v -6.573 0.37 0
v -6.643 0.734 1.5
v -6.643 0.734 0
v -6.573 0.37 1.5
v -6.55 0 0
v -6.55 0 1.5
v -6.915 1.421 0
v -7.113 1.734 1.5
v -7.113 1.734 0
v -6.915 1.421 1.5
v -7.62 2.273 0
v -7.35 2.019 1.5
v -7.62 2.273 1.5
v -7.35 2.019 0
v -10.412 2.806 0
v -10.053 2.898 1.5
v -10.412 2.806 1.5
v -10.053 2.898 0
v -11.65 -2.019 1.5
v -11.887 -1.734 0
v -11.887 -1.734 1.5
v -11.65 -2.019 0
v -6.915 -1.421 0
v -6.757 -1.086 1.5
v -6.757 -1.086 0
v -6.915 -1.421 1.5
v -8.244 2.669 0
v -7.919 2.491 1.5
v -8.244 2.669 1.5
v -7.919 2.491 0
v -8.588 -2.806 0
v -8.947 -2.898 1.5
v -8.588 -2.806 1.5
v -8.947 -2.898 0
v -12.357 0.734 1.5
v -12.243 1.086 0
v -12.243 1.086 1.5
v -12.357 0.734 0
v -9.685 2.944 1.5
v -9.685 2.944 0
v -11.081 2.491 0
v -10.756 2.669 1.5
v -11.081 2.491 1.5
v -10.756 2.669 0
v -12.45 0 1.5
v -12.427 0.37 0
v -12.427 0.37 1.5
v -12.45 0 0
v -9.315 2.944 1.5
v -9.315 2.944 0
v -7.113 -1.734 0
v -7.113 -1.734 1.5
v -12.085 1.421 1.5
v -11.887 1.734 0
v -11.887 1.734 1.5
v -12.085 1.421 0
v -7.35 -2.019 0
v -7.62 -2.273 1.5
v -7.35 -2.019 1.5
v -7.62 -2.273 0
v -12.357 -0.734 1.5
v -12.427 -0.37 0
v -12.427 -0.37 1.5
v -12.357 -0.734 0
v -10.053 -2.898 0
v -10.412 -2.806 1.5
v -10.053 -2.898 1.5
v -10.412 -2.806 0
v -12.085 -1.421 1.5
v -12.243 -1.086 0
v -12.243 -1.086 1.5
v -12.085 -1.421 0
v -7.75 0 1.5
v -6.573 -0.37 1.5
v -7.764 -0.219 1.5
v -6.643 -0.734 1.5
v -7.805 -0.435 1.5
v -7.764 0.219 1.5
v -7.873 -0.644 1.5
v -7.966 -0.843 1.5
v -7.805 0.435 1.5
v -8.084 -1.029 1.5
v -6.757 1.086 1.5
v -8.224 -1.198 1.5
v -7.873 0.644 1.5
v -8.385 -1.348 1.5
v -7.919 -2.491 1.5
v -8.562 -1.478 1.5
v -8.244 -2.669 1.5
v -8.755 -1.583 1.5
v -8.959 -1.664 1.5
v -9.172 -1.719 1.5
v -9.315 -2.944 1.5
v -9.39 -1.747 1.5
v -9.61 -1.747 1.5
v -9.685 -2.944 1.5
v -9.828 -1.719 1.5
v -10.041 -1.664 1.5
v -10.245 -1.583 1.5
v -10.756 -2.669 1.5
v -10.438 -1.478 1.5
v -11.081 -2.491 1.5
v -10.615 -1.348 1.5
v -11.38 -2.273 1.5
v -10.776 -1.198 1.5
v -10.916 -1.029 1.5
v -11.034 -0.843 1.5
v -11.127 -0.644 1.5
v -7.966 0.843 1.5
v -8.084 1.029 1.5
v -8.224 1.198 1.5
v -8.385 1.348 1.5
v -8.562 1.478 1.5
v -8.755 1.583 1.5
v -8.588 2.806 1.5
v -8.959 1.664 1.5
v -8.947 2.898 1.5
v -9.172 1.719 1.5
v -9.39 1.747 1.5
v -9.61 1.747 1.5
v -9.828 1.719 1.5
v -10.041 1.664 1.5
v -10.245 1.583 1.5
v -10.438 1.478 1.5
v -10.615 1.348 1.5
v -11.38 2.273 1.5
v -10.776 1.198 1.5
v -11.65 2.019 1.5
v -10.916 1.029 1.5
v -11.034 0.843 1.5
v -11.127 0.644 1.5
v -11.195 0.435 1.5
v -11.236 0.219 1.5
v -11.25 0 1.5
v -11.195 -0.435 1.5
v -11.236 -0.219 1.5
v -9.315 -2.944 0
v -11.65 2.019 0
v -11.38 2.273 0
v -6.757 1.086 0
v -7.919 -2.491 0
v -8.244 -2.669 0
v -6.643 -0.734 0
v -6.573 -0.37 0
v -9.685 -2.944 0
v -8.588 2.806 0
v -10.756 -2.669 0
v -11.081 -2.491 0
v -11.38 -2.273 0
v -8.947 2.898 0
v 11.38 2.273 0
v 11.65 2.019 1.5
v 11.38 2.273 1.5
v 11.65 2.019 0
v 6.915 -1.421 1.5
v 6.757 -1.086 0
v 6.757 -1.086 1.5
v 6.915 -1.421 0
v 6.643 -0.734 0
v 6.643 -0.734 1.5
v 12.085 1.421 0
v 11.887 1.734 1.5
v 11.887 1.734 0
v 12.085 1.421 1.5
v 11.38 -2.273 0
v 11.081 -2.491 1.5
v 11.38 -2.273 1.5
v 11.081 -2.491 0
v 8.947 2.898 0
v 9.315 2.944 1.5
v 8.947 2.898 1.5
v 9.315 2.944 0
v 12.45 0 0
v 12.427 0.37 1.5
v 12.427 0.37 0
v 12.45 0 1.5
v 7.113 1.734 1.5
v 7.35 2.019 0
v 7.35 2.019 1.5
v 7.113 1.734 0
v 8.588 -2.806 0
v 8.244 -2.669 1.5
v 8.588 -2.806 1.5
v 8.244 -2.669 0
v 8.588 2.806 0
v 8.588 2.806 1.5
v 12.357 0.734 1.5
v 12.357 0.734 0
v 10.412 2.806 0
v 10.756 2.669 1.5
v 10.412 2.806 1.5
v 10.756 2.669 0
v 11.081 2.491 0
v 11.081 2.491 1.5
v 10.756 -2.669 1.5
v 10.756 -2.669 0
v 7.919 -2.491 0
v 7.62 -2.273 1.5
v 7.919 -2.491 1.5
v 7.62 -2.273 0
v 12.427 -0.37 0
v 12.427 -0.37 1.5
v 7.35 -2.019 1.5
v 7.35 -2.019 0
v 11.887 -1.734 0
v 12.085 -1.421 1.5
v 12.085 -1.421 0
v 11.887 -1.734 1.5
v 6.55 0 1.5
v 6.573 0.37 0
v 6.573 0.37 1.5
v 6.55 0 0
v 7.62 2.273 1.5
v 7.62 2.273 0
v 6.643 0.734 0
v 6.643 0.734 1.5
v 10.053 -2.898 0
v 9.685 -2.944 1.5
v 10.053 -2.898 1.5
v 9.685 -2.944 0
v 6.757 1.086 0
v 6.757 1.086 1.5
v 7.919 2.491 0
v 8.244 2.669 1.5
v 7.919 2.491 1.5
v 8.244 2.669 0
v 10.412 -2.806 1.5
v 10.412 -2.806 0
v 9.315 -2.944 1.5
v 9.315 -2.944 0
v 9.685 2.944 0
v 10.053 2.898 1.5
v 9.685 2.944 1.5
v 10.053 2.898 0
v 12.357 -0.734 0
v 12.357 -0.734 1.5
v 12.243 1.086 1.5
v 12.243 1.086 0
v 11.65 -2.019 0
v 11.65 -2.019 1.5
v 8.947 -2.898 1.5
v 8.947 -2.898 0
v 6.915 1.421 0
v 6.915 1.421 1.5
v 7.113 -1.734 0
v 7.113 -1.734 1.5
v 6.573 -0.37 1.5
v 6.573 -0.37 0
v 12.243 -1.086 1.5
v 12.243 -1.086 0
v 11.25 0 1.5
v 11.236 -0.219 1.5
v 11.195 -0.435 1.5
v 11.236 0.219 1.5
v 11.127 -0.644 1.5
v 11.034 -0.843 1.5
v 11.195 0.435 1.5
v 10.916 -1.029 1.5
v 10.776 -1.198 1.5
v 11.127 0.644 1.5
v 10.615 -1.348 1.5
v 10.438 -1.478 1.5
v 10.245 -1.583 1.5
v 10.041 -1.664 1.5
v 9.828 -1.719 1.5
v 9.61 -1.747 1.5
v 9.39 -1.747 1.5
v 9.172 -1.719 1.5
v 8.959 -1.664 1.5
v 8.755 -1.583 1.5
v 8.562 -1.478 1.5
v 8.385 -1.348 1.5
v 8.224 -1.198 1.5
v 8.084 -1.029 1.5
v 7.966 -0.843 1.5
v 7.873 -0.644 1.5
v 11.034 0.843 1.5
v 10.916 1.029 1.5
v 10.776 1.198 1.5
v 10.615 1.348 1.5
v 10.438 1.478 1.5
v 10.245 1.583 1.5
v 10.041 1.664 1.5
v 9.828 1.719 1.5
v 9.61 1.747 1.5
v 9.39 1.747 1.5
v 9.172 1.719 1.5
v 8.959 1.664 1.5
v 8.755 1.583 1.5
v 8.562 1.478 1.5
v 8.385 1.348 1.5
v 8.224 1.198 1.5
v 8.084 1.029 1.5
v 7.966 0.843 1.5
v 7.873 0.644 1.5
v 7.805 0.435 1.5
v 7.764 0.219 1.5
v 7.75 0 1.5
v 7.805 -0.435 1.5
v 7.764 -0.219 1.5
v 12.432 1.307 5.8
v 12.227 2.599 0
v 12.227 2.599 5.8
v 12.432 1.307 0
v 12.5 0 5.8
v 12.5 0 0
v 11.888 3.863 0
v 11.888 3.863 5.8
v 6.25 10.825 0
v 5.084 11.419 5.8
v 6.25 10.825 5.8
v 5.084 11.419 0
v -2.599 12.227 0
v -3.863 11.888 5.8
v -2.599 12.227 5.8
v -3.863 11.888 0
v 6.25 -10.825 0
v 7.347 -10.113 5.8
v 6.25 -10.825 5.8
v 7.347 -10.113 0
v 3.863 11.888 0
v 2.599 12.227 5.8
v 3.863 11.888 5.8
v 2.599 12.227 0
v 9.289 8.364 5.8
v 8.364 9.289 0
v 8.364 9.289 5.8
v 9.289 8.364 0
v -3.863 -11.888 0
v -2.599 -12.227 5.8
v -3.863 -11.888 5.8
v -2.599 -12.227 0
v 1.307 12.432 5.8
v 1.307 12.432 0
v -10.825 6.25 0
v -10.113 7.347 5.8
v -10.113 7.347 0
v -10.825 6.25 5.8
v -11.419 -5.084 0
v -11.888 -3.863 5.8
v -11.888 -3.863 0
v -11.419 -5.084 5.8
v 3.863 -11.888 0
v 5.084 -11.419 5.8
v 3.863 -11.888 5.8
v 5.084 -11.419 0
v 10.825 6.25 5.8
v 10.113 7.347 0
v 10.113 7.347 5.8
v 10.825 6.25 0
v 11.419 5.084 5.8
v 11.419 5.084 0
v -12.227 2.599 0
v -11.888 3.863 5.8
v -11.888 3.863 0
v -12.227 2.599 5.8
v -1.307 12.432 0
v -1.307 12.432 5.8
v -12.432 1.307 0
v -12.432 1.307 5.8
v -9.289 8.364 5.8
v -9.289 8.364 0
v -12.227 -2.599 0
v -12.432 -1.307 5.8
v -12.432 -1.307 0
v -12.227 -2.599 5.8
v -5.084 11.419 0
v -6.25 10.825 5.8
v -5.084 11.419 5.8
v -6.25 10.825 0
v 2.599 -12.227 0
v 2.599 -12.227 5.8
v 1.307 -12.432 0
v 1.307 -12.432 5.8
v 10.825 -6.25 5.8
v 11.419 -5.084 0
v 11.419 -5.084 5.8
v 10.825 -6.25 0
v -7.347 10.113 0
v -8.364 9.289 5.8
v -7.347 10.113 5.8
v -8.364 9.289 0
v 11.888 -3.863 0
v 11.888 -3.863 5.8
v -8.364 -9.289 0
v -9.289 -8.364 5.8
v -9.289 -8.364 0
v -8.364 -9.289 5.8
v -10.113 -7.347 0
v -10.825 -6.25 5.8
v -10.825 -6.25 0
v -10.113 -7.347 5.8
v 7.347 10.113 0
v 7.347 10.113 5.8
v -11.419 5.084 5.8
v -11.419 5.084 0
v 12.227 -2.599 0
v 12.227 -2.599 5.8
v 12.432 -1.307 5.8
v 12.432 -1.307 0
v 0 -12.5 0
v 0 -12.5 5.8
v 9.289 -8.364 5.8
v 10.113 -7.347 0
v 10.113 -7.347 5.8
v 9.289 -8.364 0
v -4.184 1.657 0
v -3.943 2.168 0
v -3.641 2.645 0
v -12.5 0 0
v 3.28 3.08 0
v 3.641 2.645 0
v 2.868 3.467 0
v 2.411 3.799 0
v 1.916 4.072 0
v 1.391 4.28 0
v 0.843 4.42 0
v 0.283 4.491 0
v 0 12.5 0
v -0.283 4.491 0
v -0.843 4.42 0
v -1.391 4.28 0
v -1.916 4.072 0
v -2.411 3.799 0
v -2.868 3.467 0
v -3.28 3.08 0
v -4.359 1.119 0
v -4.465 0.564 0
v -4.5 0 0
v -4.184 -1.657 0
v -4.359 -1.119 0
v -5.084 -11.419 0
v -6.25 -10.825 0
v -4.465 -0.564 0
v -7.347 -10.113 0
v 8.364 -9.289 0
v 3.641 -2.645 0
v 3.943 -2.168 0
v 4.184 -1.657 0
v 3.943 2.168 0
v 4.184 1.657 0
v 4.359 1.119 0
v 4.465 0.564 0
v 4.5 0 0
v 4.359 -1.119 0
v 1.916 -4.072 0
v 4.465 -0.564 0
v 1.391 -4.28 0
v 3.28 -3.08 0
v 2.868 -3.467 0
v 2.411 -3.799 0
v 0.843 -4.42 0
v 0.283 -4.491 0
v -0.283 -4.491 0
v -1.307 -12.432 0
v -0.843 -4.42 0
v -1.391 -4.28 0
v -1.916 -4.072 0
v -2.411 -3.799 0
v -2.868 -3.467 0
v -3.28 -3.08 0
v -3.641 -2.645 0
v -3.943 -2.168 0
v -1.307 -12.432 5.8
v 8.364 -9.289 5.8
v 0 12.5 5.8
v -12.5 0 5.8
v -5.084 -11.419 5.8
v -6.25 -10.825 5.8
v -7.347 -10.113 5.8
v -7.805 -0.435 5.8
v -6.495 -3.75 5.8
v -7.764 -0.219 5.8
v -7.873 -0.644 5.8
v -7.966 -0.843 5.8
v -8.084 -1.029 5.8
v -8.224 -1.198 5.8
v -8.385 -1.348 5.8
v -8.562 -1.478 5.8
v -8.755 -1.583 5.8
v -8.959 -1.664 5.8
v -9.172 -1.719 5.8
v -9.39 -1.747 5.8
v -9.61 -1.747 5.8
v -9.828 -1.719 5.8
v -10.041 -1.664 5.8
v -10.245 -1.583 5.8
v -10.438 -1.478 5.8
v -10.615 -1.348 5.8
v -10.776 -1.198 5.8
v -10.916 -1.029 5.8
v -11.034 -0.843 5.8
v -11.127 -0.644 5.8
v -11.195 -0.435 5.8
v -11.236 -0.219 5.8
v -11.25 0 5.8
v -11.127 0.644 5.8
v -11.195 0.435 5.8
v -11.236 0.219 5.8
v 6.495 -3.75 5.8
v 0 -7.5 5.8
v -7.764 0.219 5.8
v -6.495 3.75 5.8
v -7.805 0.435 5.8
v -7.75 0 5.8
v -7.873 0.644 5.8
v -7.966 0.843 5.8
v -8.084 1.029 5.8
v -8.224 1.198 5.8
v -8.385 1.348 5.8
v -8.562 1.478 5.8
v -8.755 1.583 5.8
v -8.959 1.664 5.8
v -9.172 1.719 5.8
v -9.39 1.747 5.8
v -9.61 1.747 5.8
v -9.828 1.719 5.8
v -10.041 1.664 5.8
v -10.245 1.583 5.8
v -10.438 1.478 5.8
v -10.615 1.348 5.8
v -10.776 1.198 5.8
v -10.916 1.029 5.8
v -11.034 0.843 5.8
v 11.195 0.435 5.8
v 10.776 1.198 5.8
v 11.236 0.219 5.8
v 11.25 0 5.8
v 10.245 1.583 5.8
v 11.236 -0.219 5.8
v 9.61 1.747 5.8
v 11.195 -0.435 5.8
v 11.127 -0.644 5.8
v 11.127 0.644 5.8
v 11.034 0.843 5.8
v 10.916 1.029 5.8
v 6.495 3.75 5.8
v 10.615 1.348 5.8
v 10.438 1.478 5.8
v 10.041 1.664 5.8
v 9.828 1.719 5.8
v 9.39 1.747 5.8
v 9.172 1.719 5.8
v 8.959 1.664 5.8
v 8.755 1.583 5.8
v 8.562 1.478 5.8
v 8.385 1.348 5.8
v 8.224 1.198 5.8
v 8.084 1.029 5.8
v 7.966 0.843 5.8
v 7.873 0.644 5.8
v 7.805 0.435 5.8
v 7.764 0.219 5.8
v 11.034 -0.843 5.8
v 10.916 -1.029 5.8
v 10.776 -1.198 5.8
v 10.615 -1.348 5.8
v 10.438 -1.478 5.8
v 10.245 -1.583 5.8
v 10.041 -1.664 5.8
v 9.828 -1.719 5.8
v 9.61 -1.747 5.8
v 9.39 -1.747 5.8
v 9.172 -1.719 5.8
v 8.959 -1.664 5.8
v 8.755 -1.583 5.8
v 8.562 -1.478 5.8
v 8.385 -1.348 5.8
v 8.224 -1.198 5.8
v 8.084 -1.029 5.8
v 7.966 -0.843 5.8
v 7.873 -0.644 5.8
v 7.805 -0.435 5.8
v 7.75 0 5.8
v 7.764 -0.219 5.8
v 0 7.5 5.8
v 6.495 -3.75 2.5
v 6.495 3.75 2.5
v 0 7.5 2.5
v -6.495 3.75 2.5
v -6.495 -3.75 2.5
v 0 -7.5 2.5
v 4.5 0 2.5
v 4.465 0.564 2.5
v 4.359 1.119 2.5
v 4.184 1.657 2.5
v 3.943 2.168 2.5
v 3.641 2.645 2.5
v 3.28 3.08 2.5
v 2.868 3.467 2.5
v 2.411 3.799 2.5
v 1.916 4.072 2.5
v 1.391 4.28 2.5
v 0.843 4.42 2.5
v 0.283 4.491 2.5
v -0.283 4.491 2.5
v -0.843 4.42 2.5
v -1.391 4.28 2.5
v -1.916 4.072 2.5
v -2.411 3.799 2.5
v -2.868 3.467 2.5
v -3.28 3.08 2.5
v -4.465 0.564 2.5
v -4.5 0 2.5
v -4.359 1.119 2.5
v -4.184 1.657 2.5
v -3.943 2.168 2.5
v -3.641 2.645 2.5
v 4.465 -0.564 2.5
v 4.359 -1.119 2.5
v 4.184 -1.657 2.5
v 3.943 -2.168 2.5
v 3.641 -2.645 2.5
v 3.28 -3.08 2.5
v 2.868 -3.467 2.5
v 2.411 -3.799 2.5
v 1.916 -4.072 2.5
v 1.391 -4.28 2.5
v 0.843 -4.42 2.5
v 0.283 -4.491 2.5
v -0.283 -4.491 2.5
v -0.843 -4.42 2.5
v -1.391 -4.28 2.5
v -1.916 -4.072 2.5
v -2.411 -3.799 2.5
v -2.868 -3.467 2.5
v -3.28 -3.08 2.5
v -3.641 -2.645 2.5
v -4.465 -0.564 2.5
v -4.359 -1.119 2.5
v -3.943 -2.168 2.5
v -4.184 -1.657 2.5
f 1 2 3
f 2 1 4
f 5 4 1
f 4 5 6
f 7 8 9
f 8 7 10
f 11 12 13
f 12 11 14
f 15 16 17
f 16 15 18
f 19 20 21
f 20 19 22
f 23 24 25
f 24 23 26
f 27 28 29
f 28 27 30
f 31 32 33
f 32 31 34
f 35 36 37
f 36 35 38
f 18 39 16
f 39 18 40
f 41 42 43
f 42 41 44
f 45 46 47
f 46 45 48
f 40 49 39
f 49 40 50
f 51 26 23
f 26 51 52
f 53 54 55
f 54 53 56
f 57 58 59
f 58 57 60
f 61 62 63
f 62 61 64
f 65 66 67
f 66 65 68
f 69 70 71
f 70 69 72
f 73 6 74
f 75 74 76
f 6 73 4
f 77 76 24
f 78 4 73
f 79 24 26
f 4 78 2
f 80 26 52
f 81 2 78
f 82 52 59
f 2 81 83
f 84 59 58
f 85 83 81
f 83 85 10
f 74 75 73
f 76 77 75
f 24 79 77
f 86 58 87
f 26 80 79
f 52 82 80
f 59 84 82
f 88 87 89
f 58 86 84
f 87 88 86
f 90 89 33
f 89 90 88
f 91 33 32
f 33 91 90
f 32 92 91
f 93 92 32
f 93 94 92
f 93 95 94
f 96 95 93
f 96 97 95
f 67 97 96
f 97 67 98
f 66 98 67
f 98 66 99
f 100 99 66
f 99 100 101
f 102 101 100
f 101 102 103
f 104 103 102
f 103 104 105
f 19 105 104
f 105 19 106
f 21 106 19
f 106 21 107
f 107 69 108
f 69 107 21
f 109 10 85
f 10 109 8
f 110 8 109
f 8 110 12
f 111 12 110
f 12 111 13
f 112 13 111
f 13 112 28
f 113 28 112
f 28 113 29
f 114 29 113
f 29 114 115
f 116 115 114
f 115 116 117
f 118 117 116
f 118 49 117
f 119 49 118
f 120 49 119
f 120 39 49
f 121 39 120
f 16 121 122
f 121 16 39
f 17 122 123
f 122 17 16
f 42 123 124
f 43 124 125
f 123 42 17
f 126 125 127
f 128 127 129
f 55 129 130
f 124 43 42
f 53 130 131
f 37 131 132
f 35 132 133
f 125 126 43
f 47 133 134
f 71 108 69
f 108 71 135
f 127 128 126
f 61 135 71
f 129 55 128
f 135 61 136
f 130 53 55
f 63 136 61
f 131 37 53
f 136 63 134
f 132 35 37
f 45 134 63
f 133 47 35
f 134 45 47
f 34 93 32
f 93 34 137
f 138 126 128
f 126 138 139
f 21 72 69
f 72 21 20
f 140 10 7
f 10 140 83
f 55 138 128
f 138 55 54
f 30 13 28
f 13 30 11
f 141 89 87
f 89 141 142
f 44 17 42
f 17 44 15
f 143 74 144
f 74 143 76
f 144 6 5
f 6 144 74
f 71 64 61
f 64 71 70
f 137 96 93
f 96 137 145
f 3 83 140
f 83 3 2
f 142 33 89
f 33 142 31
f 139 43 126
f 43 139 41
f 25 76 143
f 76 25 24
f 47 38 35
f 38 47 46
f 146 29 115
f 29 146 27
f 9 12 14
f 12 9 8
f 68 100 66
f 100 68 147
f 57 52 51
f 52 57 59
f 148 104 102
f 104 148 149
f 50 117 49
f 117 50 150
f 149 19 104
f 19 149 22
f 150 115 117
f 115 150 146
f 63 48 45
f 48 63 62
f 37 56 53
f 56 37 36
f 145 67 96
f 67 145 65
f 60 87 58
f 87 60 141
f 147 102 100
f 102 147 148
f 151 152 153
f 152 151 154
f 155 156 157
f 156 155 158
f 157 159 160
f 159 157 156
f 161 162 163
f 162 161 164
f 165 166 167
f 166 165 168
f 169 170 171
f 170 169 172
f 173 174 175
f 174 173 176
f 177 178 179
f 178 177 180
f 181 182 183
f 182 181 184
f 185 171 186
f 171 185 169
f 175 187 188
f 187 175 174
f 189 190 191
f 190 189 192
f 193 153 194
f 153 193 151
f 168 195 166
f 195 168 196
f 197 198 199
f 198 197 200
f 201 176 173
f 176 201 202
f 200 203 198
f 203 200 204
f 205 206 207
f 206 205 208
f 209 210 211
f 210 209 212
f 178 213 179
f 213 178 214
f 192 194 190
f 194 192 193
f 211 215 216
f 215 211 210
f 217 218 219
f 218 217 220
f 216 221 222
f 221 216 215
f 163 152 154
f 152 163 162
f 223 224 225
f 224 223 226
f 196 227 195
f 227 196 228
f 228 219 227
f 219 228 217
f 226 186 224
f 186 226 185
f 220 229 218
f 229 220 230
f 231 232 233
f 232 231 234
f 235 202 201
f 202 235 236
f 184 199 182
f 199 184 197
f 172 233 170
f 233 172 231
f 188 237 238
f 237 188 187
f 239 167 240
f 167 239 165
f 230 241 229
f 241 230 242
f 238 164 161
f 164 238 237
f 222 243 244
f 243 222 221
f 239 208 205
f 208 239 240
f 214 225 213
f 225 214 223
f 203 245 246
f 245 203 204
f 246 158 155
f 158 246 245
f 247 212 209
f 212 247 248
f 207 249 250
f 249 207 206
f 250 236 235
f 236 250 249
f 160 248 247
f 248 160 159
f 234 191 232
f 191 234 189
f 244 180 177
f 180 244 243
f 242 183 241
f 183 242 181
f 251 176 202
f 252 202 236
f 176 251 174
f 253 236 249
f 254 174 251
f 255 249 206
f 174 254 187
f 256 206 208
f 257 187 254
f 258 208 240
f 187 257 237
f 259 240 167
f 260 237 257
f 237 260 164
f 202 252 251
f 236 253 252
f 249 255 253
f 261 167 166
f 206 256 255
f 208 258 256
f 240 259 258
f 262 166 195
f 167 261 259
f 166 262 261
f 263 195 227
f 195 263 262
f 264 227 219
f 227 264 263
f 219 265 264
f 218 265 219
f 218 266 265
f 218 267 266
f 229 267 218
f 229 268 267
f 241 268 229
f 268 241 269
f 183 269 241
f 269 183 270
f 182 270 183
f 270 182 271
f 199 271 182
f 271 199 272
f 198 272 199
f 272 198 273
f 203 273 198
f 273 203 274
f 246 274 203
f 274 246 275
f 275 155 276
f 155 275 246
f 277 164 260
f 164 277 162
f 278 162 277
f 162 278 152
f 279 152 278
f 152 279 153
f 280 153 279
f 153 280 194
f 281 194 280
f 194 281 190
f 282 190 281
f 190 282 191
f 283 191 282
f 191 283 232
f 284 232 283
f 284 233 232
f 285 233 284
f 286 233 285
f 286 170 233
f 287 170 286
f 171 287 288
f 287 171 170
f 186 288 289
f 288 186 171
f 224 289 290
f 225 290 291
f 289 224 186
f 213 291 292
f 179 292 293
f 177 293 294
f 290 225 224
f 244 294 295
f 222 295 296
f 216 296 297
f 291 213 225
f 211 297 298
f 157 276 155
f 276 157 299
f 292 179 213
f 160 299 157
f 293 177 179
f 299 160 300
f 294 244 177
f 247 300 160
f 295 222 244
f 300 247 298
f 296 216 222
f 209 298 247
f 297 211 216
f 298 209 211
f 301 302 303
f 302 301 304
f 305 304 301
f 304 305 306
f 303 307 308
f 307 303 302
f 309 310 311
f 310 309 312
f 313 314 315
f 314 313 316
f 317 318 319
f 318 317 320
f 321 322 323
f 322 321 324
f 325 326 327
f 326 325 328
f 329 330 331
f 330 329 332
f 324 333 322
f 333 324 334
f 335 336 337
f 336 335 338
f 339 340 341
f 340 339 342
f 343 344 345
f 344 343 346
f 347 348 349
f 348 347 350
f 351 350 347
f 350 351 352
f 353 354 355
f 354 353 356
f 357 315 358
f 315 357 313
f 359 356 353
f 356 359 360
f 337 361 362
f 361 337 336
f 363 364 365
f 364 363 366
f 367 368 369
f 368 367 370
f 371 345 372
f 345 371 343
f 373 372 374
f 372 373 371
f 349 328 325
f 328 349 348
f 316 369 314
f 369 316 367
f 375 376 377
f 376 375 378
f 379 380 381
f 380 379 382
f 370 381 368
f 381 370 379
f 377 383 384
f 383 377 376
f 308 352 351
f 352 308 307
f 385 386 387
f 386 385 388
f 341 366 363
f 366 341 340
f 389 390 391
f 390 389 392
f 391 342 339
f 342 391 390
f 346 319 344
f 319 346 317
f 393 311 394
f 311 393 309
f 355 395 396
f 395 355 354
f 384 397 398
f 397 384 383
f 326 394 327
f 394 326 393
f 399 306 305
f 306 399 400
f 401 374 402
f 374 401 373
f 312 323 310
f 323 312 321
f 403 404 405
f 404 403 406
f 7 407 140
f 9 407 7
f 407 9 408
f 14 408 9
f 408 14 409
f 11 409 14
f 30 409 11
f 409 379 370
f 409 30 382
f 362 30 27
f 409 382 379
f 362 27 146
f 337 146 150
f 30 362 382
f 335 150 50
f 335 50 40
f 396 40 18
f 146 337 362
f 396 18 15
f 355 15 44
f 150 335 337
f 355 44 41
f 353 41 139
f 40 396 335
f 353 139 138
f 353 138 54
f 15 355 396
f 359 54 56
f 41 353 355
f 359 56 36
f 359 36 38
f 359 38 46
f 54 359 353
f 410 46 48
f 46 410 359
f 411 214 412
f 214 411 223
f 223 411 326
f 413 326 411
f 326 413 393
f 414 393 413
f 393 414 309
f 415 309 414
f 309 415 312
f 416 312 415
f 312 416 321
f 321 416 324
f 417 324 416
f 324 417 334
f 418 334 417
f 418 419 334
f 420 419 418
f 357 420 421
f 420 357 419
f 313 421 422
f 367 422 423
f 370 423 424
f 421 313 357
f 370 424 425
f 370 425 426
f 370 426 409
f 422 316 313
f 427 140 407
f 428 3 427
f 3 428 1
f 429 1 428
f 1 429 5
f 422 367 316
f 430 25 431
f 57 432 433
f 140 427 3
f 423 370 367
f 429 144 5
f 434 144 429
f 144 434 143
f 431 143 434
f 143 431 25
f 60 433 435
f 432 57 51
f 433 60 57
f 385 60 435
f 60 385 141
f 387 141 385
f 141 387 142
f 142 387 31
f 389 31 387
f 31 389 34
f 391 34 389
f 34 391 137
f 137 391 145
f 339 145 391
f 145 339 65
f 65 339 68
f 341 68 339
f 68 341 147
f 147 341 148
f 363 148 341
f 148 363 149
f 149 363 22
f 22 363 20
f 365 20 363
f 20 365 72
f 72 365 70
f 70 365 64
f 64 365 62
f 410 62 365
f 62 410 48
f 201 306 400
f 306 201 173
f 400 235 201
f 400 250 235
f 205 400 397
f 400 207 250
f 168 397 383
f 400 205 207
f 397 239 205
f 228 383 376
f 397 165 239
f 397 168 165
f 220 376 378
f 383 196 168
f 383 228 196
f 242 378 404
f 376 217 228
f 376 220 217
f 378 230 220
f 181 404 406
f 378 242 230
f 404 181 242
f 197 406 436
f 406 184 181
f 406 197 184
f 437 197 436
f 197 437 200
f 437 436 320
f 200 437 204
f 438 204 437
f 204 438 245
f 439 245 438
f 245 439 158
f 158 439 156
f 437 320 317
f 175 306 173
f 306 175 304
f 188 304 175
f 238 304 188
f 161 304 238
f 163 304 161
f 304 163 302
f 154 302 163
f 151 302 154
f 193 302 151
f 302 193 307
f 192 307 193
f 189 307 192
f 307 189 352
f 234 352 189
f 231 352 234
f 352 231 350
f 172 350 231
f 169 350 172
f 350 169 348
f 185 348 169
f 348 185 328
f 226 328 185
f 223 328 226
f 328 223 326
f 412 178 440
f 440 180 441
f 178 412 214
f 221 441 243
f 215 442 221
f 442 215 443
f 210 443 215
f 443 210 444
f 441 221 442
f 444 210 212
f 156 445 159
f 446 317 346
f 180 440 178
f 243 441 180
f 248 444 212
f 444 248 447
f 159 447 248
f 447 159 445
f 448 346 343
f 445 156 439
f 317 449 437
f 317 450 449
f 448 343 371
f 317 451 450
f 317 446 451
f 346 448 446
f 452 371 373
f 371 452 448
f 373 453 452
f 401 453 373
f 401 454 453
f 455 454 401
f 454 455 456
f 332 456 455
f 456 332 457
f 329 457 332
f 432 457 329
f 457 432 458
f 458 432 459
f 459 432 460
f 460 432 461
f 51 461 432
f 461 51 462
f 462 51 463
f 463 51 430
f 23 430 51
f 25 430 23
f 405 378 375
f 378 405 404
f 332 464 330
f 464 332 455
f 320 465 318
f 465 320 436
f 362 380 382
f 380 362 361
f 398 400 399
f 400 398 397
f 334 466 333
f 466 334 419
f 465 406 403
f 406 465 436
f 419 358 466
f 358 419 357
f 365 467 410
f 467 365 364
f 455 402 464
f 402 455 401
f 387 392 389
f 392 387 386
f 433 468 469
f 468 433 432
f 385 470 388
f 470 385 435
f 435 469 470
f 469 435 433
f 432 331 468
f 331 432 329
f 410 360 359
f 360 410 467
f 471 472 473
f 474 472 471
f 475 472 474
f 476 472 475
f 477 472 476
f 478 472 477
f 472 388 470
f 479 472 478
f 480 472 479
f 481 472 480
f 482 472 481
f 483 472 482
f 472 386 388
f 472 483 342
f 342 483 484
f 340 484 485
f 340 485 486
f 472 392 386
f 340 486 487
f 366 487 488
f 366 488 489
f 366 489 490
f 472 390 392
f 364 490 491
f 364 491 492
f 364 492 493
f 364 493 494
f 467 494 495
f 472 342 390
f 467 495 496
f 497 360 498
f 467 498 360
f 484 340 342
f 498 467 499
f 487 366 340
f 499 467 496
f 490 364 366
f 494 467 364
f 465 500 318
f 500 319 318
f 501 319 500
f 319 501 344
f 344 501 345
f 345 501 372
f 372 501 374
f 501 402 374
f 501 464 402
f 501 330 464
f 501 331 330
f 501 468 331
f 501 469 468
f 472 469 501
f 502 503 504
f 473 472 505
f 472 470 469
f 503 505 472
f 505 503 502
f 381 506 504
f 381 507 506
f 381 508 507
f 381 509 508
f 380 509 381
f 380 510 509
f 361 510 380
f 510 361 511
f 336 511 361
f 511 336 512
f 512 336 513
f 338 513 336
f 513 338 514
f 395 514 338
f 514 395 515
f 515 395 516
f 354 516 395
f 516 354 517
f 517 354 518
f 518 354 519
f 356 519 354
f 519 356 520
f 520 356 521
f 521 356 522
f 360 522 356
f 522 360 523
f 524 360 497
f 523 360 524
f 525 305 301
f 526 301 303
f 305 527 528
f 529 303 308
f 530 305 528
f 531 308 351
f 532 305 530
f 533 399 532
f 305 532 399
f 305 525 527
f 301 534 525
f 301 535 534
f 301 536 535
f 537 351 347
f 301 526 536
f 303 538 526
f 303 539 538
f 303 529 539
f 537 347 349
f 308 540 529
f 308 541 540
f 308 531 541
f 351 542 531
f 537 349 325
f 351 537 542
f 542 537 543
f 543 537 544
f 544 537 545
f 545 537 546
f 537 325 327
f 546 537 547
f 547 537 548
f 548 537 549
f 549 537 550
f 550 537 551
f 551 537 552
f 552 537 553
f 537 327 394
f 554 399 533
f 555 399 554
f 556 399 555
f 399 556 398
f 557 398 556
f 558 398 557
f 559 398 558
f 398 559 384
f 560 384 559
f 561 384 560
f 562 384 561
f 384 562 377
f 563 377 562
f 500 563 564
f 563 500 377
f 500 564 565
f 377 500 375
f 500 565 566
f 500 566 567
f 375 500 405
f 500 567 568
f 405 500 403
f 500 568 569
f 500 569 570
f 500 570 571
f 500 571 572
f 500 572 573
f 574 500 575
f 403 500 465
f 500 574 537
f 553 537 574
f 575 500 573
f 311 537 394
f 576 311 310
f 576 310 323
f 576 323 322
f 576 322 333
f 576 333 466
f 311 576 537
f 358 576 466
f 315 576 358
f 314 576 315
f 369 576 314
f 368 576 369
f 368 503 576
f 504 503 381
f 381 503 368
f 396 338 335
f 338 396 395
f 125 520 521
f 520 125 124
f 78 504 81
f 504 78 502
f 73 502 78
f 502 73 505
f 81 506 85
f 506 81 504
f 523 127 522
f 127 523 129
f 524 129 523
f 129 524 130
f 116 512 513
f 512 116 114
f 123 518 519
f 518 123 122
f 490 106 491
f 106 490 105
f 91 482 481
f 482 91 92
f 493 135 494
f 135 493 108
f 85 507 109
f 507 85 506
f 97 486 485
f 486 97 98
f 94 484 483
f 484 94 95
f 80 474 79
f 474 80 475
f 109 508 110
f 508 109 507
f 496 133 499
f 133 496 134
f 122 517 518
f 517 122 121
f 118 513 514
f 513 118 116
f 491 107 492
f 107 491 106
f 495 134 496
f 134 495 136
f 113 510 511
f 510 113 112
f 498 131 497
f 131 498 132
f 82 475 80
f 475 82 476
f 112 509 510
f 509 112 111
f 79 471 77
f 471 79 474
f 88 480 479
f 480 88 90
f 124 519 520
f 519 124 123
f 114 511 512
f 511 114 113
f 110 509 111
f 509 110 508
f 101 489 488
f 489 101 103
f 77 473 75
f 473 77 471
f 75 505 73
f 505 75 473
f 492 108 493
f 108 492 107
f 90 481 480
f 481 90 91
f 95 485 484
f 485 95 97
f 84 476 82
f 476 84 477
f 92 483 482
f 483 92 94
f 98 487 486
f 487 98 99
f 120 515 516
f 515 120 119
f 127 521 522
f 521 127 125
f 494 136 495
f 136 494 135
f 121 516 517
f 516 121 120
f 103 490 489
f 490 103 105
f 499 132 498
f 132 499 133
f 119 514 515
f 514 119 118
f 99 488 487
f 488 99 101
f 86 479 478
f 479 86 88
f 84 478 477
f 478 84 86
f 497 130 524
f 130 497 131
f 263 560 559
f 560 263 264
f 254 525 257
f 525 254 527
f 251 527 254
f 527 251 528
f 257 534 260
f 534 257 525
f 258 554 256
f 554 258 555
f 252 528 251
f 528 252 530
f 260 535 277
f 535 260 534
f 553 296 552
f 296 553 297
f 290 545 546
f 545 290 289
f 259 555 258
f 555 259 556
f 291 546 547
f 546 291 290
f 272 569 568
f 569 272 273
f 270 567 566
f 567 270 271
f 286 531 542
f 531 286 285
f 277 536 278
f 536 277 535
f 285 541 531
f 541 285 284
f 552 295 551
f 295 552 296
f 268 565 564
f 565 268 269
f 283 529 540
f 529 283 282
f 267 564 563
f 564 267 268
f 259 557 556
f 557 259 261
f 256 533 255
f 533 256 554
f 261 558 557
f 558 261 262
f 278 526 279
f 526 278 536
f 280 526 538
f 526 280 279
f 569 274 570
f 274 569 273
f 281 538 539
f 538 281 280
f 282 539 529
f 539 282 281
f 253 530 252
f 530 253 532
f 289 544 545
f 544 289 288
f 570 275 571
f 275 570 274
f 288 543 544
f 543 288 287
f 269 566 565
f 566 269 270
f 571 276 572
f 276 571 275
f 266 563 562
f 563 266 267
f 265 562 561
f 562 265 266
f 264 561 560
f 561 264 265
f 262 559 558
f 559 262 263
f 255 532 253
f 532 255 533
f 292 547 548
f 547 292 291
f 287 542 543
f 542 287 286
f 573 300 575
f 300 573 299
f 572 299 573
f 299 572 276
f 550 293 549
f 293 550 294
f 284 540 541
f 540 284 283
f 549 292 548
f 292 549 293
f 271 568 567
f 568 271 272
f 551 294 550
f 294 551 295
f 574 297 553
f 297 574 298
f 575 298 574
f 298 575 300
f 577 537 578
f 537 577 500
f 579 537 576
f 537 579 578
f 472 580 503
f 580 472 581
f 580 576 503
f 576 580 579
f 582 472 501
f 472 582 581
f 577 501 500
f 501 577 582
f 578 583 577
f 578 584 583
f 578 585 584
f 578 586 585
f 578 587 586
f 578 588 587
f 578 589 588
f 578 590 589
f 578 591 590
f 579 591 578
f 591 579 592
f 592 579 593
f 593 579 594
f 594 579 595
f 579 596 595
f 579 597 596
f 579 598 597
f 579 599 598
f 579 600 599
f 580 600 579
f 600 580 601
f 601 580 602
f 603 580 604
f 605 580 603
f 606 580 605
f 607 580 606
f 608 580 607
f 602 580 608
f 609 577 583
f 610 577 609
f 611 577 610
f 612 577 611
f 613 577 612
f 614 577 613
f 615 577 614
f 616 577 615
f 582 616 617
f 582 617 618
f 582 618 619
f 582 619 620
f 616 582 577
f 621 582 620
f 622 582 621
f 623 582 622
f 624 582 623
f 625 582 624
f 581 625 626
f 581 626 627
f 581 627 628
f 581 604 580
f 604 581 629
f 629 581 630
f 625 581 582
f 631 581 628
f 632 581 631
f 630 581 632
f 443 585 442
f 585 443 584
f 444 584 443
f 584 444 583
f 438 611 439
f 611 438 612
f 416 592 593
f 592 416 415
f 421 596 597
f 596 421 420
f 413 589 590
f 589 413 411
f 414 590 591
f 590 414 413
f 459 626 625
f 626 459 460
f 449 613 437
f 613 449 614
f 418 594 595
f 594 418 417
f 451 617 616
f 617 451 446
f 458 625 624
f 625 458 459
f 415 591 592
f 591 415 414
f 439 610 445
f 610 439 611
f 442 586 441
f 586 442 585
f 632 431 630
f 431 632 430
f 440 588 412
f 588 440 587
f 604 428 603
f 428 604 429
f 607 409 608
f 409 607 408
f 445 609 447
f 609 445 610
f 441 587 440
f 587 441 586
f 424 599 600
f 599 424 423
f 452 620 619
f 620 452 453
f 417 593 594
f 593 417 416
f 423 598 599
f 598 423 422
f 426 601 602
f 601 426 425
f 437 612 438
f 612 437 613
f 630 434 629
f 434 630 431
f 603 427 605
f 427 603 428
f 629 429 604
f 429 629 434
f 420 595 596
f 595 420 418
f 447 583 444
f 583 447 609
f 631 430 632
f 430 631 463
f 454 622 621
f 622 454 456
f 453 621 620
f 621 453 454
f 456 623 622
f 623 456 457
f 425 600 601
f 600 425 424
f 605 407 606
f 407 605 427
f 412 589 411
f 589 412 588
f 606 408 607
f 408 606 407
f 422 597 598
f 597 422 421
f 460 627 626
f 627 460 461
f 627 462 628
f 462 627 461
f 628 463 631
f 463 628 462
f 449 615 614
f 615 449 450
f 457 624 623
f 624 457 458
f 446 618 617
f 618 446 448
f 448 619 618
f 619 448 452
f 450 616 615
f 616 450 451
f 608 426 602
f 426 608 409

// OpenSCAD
// file: tnut-m8-holder.scad
// Copyright (C) 2022  Bhavin Gandhi
//
// This program is free software: you can redistribute it and/or modify
// it under the terms of the GNU General Public License as published by
// the Free Software Foundation, either version 3 of the License, or
// (at your option) any later version.
//
// This program is distributed in the hope that it will be useful,
// but WITHOUT ANY WARRANTY; without even the implied warranty of
// MERCHANTABILITY or FITNESS FOR A PARTICULAR PURPOSE.  See the
// GNU General Public License for more details.
//
// You should have received a copy of the GNU General Public License
// along with this program.  If not, see <https://www.gnu.org/licenses/>.

module tnut_m8_holder(base_thickness, create_screw_heads)
{
    difference()
    {
        // Main body
        // Nut thickness is 6.6mm
        cylinder(h = base_thickness+3.3, r = 12.5, $fn = 60);

        // Screw holes
        // Actual diameter of screw 2.8mm
        translate(v = [-9.5, 0, -1]) cylinder(h = base_thickness+4.5, r = 1.65+0.1, $fn = 50);
        translate(v = [9.5, 0, -1]) cylinder(h = base_thickness+4.5, r = 1.65+0.1, $fn = 50);

        // Screw heads
        // Actul diameter of screw head 5.5mm
        if (create_screw_heads)
        {
            translate(v = [-9.5, 0, -1]) cylinder(h = base_thickness, r = 2.75+0.2, $fn = 50);
            translate(v = [9.5, 0, -1]) cylinder(h = base_thickness, r = 2.75+0.2, $fn = 50);
        }

        // M8 nut hole
        // https://amesweb.info/Fasteners/Nut/Metric-Hex-Nut-Sizes-Dimensions-Chart.aspx
        // The actual nut e max might slightly differ, I had one with 14.52mm
        rotate([0, 0, 90]) translate(v = [0, 0, base_thickness]) cylinder(h = 4, d = 15, $fn = 6);

        // Threaded M8 rod passthrough
        translate(v = [0, 0, -1]) cylinder(h = base_thickness+4.5, r = 4.5, $fn = 50);
    }
}

// tnut_m8_holder(2.5, true);
// main file
// Top part of the holder

use <tnut-m8-holder.scad>

tnut_m8_holder(2.5, true);
